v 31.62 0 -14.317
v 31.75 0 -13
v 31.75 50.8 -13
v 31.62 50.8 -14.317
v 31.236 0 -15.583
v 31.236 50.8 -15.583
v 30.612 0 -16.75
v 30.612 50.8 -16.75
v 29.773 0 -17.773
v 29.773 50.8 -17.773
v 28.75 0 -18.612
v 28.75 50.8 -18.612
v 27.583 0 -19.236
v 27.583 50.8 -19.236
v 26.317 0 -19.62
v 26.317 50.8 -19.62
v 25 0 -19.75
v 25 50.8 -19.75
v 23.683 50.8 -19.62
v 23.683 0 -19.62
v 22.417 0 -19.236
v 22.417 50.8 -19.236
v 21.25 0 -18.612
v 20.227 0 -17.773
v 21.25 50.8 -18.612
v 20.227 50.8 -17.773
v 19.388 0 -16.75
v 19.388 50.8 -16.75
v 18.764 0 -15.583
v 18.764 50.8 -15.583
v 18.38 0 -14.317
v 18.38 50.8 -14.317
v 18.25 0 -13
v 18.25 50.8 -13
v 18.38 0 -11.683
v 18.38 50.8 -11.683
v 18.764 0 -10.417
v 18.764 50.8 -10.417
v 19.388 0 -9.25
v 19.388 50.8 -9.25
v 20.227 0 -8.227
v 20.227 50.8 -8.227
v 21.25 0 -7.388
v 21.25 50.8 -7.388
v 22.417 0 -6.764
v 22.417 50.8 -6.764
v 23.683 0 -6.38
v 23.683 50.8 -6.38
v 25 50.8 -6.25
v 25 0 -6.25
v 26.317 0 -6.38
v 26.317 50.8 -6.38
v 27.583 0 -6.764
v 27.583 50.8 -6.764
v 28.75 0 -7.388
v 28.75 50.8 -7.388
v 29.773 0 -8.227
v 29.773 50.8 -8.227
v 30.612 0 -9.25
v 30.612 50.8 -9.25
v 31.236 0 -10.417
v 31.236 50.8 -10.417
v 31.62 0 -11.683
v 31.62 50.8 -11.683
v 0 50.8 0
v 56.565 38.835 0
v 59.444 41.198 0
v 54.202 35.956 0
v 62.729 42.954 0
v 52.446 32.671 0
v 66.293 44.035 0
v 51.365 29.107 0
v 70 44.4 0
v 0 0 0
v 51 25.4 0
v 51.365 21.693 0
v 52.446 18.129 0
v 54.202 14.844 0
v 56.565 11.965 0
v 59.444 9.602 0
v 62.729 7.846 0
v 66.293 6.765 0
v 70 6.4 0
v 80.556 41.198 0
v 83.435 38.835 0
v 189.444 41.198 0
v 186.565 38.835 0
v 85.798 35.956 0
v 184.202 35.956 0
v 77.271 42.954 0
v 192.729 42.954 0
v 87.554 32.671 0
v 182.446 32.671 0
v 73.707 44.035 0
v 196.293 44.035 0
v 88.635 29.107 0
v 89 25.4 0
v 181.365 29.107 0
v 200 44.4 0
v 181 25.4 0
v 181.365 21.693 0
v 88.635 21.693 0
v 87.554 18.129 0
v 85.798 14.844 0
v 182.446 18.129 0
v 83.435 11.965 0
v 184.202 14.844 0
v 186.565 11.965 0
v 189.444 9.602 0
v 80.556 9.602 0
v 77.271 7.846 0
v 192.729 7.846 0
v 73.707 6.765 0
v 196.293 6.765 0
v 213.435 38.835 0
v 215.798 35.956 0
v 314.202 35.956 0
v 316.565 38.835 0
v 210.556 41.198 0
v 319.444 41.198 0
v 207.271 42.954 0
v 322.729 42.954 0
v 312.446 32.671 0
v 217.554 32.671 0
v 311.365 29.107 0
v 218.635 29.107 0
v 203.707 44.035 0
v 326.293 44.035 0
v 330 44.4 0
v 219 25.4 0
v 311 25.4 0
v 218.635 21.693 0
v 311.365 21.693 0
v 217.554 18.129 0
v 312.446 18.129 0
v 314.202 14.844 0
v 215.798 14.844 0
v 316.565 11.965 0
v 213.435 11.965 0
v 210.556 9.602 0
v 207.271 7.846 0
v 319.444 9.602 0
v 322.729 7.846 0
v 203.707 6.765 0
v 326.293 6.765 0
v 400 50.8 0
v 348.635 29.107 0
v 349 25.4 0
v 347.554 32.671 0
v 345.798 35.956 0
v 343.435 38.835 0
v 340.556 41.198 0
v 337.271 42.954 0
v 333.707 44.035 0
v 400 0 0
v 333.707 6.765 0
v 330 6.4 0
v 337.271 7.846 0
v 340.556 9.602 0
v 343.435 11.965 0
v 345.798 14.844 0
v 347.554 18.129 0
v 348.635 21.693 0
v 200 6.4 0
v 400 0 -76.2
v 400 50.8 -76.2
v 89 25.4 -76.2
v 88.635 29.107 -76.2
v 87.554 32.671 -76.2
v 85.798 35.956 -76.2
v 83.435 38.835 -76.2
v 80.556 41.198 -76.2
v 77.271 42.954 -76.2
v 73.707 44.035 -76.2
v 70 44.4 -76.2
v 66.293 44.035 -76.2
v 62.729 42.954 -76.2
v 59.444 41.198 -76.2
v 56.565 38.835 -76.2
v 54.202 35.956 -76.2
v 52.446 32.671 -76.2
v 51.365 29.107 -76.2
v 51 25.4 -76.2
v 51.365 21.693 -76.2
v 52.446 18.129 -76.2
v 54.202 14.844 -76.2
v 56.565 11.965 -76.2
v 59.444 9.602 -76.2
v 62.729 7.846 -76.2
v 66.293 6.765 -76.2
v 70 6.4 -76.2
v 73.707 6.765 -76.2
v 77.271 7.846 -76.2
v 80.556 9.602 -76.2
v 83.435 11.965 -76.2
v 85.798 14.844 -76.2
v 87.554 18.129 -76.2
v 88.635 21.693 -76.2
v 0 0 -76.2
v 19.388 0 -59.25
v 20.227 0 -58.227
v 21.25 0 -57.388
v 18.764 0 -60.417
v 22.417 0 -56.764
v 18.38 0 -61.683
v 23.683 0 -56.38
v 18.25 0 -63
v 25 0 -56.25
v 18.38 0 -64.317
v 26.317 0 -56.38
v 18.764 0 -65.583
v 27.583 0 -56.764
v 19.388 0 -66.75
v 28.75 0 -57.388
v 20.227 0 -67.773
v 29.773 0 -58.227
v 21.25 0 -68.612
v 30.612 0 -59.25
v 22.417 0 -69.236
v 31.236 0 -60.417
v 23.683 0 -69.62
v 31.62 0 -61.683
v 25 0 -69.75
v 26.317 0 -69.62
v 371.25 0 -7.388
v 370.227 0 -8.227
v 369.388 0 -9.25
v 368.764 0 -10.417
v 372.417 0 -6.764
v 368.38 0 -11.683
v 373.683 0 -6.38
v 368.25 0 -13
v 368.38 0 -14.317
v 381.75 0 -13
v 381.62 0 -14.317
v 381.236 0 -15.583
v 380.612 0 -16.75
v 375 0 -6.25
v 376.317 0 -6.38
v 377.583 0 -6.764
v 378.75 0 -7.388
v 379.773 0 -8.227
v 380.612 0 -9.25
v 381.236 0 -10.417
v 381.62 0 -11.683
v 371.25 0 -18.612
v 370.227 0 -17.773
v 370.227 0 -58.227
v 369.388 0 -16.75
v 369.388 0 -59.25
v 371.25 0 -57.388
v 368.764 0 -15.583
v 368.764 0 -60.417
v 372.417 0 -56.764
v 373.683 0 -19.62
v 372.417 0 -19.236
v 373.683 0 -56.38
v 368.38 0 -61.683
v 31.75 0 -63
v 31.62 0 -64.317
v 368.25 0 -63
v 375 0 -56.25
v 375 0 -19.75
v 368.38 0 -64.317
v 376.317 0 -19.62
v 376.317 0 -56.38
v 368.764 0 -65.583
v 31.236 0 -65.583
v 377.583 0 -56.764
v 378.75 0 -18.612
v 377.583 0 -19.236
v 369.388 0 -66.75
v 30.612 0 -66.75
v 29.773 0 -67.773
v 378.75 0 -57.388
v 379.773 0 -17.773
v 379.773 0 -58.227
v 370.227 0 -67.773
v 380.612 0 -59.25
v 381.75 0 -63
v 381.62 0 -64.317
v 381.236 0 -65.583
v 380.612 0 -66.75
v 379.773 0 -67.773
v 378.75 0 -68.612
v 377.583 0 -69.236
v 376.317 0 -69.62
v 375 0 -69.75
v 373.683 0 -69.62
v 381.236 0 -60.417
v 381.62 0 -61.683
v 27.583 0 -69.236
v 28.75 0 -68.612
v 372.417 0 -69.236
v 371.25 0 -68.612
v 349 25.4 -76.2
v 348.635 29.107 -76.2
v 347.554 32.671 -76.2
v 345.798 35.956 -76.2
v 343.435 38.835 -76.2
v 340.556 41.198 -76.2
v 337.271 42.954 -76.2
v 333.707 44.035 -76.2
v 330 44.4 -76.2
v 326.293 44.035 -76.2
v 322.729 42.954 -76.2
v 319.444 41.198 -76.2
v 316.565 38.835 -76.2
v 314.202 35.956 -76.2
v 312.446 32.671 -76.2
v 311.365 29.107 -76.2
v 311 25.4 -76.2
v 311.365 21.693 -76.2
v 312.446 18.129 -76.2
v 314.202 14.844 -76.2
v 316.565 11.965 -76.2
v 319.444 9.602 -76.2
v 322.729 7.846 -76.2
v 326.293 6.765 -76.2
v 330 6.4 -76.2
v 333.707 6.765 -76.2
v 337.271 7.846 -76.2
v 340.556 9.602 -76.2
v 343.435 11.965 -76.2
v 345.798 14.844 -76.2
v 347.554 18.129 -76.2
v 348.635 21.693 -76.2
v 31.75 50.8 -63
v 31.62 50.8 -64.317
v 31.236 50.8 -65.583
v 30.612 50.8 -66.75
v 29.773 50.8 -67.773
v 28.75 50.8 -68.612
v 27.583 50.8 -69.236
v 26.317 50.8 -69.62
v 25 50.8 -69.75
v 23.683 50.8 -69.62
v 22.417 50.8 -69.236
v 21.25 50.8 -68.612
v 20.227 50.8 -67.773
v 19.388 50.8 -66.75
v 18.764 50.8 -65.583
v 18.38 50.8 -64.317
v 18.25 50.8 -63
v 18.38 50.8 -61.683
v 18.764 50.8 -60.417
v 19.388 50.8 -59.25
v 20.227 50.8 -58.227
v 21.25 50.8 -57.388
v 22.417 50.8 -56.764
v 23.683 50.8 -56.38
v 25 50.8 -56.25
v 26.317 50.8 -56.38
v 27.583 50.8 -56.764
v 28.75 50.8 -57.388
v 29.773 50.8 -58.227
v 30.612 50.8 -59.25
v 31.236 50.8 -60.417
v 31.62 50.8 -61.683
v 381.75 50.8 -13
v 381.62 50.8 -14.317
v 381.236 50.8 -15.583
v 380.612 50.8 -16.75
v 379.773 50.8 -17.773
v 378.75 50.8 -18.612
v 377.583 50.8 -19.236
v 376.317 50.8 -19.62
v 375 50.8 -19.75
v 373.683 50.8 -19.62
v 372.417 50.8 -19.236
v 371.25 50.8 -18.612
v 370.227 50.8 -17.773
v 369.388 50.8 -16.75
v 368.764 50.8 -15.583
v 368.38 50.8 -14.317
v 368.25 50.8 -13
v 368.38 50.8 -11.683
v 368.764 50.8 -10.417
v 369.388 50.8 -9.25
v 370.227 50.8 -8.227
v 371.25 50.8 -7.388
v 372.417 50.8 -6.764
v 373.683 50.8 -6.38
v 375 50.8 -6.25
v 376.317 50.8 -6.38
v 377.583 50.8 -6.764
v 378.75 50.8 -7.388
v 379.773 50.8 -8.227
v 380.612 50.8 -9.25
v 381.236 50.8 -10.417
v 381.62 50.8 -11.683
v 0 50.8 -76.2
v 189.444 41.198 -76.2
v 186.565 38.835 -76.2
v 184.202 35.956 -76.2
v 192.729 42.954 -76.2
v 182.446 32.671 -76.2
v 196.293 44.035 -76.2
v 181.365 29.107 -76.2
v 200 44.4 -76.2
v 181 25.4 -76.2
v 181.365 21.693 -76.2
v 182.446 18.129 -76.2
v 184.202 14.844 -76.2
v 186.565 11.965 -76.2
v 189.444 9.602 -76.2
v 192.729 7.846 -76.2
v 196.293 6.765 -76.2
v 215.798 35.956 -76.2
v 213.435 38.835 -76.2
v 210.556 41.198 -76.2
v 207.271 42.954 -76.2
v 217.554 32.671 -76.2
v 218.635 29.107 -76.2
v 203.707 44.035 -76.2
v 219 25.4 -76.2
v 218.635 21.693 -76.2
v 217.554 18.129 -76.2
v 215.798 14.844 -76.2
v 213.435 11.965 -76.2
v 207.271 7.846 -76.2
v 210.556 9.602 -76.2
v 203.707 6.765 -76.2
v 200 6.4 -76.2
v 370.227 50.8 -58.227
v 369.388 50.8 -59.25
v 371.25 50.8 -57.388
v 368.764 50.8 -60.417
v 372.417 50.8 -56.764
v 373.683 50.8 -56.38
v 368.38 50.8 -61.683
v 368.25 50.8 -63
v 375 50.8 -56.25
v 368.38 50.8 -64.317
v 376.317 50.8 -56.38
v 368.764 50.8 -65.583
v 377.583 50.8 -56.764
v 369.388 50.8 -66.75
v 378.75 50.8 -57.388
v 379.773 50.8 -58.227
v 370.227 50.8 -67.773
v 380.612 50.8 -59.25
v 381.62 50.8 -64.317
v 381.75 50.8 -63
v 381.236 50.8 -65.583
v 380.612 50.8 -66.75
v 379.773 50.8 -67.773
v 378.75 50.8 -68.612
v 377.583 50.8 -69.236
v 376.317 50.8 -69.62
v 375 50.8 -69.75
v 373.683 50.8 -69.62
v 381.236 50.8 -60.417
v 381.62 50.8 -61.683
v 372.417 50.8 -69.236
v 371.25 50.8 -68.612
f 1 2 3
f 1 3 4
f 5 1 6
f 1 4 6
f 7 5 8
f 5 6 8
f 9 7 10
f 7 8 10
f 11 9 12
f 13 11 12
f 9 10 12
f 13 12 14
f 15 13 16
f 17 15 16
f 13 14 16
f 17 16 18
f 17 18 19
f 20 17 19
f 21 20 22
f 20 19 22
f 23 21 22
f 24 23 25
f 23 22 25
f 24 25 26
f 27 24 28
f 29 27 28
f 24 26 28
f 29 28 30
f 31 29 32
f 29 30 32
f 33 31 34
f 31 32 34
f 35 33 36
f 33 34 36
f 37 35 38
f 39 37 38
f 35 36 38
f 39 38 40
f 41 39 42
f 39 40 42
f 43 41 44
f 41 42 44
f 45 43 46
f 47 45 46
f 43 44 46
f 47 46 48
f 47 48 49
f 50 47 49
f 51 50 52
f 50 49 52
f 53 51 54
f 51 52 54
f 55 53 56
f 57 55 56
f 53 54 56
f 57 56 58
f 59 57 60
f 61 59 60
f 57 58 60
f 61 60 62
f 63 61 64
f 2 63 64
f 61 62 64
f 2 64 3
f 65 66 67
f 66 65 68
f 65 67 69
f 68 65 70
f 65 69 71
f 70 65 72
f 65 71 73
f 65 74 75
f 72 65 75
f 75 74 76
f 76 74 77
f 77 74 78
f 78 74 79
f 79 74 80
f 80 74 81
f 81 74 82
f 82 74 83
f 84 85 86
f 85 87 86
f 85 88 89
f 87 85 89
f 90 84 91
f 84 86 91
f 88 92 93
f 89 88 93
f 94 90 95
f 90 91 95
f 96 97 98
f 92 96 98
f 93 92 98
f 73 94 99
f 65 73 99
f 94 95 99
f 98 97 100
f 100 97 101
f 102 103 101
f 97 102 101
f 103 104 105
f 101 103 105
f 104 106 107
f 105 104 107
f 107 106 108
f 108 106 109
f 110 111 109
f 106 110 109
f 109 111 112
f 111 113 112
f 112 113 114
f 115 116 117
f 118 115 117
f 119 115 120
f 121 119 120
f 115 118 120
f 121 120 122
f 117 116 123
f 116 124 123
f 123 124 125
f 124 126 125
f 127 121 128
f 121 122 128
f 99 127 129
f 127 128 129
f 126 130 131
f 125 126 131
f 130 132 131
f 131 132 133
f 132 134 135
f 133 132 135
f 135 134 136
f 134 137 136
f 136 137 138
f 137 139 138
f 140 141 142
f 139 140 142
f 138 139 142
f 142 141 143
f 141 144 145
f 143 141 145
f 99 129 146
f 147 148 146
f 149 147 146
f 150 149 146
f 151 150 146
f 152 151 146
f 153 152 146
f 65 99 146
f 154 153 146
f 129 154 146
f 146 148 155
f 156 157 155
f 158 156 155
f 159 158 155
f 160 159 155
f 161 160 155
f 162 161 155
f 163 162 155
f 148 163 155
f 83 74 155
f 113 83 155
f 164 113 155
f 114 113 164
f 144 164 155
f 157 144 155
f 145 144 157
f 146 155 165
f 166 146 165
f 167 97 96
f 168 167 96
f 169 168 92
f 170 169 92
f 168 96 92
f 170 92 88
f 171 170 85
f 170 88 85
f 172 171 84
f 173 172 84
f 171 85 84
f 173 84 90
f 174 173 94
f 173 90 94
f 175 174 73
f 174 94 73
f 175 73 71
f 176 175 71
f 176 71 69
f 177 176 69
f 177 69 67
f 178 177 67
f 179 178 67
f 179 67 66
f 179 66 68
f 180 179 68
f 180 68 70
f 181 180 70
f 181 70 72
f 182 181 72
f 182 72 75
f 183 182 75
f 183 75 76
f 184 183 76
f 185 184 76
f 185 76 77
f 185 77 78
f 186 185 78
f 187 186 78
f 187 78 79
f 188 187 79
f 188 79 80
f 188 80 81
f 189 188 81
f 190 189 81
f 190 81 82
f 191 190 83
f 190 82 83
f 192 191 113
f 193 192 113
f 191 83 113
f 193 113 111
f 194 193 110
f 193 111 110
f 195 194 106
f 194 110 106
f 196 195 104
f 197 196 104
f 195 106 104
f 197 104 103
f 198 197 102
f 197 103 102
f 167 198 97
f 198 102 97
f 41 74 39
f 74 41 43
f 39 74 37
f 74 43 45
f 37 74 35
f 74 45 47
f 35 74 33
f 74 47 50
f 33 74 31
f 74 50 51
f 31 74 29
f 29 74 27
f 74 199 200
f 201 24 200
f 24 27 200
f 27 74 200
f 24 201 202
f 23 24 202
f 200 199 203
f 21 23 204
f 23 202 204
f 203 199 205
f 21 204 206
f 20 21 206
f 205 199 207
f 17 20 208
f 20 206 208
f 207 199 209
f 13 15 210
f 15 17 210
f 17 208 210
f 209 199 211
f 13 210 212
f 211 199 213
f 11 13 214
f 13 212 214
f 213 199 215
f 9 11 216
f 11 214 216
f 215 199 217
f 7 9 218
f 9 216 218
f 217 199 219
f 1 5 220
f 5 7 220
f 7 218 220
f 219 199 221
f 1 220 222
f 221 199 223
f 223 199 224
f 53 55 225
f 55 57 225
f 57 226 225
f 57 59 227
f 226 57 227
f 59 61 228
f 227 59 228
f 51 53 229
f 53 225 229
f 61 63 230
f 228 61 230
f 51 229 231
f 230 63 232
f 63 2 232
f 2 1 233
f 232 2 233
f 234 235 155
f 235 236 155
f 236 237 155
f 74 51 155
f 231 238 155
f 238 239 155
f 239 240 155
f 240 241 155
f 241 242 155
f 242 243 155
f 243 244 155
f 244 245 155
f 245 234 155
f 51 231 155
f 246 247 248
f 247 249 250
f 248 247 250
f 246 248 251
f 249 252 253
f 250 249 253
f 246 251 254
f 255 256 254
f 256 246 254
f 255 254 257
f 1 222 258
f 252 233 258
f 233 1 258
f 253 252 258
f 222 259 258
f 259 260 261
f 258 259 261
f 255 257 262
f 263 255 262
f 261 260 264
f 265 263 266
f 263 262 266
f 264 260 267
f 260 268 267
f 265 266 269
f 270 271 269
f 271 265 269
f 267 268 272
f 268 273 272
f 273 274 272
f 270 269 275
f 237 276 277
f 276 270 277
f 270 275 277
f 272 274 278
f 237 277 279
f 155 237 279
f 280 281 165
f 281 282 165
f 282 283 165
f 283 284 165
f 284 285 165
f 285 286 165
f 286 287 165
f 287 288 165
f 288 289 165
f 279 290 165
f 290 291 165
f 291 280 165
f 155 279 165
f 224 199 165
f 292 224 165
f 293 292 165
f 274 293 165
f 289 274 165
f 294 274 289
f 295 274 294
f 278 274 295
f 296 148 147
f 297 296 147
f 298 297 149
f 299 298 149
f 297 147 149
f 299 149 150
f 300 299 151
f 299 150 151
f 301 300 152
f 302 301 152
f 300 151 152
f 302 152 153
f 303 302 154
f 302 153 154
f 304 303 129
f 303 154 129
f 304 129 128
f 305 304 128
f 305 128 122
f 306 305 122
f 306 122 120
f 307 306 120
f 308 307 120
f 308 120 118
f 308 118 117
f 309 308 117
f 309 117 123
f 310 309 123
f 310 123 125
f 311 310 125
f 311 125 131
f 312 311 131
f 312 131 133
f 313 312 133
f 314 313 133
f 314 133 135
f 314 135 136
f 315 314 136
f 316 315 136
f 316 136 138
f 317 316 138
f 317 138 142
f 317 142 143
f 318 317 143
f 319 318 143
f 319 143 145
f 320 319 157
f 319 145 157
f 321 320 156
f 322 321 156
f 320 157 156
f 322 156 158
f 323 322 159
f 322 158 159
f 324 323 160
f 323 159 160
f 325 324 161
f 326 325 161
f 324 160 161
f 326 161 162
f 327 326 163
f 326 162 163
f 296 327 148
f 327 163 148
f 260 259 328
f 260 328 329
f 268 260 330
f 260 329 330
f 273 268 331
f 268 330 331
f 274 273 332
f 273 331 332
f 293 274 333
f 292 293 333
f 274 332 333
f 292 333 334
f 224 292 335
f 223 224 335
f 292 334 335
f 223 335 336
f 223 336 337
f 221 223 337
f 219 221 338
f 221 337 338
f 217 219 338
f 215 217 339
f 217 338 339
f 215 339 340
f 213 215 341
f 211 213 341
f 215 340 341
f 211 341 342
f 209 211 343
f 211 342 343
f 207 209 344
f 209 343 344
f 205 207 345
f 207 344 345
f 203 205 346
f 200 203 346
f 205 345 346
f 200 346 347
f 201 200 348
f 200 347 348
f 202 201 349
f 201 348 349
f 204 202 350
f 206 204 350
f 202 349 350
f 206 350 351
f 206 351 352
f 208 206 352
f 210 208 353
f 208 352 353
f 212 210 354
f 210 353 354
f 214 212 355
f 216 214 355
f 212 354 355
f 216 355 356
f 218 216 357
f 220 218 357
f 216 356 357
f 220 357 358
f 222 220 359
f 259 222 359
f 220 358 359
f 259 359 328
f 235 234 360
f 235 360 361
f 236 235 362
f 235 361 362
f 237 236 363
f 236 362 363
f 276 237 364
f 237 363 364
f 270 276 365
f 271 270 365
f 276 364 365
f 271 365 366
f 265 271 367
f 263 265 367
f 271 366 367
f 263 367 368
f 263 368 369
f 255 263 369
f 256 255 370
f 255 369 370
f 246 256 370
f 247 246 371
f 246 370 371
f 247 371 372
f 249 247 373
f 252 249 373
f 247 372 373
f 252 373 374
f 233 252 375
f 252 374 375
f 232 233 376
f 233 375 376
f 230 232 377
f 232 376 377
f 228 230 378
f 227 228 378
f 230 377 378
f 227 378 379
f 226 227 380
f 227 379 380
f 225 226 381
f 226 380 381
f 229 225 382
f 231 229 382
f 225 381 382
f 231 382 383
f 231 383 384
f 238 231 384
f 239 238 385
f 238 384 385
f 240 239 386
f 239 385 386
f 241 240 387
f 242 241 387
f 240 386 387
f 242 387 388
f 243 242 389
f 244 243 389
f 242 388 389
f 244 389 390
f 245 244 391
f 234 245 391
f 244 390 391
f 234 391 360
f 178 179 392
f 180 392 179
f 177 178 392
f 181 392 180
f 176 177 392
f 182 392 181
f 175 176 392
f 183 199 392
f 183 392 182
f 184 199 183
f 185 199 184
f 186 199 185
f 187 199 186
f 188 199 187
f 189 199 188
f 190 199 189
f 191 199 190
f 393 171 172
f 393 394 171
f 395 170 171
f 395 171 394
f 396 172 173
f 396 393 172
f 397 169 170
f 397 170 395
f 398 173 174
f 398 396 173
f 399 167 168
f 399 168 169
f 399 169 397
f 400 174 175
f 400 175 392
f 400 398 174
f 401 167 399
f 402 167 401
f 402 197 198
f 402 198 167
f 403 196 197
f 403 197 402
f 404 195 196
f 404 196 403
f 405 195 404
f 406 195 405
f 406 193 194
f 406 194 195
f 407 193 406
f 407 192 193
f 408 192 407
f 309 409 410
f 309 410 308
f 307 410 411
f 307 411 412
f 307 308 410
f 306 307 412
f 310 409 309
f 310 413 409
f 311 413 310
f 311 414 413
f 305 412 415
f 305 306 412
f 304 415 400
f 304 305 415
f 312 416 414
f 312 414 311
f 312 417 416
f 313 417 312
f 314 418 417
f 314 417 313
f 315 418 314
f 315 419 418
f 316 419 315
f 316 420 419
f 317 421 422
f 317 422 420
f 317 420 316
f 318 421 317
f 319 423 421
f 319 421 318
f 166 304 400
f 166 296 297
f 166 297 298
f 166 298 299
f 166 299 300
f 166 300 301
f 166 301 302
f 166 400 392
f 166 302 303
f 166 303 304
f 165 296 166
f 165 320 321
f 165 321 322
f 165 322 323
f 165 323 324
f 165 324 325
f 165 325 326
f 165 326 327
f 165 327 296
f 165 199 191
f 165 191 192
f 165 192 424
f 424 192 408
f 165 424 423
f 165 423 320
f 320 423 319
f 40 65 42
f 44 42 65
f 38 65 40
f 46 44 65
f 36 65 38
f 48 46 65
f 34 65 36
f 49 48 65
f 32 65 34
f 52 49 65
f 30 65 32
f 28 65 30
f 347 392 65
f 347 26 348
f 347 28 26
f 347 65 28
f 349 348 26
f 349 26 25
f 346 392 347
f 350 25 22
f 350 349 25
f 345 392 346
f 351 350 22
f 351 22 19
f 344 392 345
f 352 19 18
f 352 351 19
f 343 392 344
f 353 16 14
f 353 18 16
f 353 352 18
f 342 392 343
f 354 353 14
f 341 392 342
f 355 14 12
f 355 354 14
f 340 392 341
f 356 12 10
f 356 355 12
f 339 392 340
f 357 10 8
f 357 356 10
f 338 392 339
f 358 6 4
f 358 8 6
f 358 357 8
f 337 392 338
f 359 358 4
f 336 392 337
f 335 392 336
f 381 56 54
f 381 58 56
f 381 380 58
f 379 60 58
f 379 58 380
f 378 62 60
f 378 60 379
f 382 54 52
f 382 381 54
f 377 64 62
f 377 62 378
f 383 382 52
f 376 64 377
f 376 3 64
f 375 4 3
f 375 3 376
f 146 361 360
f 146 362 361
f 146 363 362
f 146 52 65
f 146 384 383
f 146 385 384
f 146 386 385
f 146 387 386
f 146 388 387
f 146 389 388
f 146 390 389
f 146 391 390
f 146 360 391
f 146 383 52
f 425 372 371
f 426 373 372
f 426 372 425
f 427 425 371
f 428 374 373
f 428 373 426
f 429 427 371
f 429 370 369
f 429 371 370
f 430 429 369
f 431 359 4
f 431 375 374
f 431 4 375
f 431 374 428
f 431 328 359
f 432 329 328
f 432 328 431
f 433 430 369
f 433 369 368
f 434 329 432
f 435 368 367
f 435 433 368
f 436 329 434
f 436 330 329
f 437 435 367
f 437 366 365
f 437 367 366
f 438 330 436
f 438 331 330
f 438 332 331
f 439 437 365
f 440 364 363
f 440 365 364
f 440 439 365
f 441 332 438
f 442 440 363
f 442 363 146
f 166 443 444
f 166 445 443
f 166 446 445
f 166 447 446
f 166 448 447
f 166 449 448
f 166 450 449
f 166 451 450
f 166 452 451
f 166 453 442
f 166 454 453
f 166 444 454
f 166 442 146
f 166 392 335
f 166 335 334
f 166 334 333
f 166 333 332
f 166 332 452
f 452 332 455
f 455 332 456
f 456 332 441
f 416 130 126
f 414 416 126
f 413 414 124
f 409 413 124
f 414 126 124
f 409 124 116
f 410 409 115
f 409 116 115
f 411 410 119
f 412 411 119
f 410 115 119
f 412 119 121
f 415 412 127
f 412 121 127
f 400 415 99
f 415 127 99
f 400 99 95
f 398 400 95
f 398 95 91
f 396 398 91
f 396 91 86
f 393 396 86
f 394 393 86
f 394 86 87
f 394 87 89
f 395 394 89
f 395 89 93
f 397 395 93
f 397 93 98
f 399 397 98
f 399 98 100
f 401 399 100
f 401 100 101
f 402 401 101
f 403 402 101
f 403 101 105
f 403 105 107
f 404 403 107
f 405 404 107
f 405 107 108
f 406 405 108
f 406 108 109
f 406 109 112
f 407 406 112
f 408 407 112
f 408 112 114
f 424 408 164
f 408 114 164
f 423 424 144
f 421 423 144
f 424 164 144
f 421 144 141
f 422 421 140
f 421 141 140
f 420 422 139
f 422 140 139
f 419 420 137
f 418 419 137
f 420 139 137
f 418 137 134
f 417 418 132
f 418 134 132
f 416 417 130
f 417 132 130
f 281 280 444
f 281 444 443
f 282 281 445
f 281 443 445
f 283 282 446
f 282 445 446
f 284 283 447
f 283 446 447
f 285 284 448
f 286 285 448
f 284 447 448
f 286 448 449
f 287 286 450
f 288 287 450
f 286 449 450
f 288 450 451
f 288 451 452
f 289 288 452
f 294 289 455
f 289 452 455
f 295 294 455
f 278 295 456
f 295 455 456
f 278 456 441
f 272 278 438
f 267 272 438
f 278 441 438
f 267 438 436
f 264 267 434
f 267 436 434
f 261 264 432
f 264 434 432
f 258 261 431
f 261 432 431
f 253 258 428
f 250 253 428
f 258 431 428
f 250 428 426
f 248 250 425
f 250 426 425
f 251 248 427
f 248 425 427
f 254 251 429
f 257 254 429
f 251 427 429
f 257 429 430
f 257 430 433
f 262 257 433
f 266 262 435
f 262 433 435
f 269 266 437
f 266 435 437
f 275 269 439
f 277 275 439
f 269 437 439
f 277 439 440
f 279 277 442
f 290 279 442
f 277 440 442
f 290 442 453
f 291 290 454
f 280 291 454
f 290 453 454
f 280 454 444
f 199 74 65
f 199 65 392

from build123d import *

# Parameters (mm, degrees)
SKETCH1_W           = 400
SKETCH1_H           = 76.2
BOSS_EXTRUDE1_DEPTH = 50.8
SKETCH3_R           = 6.75
CUT_EXTRUDE2_DEPTH  = 50.8
SKETCH5_R           = 19
CUT_EXTRUDE3_DEPTH  = 77.2


with BuildPart() as part:
    # Sketch1 → Boss-Extrude1 (new body)
    with BuildSketch(Plane(origin=(0, 0, 0), x_dir=(1, 0, 0), z_dir=(0, 1, 0))):
        with Locations((200, 38.1)):
            Rectangle(SKETCH1_W, SKETCH1_H)
    extrude(amount=BOSS_EXTRUDE1_DEPTH)

    # Sketch3 → Cut-Extrude2 (cut)
    with BuildSketch(Plane(origin=(0, 50.8, 0), x_dir=(1, 0, 0), z_dir=(0, 1, 0))):
        with Locations((25, 63)):
            Circle(SKETCH3_R)
        with Locations((25, 13)):
            Circle(SKETCH3_R)
        with Locations((375, 63)):
            Circle(SKETCH3_R)
        with Locations((375, 13)):
            Circle(SKETCH3_R)
    extrude(amount=-CUT_EXTRUDE2_DEPTH, mode=Mode.SUBTRACT)

    # Sketch5 → Cut-Extrude3 (cut, through all)
    with BuildSketch(Plane.XY):
        with Locations((200, 25.4)):
            Circle(SKETCH5_R)
        with Locations((70, 25.4)):
            Circle(SKETCH5_R)
        with Locations((330, 25.4)):
            Circle(SKETCH5_R)
    extrude(amount=-CUT_EXTRUDE3_DEPTH, mode=Mode.SUBTRACT)


solid = part.part
